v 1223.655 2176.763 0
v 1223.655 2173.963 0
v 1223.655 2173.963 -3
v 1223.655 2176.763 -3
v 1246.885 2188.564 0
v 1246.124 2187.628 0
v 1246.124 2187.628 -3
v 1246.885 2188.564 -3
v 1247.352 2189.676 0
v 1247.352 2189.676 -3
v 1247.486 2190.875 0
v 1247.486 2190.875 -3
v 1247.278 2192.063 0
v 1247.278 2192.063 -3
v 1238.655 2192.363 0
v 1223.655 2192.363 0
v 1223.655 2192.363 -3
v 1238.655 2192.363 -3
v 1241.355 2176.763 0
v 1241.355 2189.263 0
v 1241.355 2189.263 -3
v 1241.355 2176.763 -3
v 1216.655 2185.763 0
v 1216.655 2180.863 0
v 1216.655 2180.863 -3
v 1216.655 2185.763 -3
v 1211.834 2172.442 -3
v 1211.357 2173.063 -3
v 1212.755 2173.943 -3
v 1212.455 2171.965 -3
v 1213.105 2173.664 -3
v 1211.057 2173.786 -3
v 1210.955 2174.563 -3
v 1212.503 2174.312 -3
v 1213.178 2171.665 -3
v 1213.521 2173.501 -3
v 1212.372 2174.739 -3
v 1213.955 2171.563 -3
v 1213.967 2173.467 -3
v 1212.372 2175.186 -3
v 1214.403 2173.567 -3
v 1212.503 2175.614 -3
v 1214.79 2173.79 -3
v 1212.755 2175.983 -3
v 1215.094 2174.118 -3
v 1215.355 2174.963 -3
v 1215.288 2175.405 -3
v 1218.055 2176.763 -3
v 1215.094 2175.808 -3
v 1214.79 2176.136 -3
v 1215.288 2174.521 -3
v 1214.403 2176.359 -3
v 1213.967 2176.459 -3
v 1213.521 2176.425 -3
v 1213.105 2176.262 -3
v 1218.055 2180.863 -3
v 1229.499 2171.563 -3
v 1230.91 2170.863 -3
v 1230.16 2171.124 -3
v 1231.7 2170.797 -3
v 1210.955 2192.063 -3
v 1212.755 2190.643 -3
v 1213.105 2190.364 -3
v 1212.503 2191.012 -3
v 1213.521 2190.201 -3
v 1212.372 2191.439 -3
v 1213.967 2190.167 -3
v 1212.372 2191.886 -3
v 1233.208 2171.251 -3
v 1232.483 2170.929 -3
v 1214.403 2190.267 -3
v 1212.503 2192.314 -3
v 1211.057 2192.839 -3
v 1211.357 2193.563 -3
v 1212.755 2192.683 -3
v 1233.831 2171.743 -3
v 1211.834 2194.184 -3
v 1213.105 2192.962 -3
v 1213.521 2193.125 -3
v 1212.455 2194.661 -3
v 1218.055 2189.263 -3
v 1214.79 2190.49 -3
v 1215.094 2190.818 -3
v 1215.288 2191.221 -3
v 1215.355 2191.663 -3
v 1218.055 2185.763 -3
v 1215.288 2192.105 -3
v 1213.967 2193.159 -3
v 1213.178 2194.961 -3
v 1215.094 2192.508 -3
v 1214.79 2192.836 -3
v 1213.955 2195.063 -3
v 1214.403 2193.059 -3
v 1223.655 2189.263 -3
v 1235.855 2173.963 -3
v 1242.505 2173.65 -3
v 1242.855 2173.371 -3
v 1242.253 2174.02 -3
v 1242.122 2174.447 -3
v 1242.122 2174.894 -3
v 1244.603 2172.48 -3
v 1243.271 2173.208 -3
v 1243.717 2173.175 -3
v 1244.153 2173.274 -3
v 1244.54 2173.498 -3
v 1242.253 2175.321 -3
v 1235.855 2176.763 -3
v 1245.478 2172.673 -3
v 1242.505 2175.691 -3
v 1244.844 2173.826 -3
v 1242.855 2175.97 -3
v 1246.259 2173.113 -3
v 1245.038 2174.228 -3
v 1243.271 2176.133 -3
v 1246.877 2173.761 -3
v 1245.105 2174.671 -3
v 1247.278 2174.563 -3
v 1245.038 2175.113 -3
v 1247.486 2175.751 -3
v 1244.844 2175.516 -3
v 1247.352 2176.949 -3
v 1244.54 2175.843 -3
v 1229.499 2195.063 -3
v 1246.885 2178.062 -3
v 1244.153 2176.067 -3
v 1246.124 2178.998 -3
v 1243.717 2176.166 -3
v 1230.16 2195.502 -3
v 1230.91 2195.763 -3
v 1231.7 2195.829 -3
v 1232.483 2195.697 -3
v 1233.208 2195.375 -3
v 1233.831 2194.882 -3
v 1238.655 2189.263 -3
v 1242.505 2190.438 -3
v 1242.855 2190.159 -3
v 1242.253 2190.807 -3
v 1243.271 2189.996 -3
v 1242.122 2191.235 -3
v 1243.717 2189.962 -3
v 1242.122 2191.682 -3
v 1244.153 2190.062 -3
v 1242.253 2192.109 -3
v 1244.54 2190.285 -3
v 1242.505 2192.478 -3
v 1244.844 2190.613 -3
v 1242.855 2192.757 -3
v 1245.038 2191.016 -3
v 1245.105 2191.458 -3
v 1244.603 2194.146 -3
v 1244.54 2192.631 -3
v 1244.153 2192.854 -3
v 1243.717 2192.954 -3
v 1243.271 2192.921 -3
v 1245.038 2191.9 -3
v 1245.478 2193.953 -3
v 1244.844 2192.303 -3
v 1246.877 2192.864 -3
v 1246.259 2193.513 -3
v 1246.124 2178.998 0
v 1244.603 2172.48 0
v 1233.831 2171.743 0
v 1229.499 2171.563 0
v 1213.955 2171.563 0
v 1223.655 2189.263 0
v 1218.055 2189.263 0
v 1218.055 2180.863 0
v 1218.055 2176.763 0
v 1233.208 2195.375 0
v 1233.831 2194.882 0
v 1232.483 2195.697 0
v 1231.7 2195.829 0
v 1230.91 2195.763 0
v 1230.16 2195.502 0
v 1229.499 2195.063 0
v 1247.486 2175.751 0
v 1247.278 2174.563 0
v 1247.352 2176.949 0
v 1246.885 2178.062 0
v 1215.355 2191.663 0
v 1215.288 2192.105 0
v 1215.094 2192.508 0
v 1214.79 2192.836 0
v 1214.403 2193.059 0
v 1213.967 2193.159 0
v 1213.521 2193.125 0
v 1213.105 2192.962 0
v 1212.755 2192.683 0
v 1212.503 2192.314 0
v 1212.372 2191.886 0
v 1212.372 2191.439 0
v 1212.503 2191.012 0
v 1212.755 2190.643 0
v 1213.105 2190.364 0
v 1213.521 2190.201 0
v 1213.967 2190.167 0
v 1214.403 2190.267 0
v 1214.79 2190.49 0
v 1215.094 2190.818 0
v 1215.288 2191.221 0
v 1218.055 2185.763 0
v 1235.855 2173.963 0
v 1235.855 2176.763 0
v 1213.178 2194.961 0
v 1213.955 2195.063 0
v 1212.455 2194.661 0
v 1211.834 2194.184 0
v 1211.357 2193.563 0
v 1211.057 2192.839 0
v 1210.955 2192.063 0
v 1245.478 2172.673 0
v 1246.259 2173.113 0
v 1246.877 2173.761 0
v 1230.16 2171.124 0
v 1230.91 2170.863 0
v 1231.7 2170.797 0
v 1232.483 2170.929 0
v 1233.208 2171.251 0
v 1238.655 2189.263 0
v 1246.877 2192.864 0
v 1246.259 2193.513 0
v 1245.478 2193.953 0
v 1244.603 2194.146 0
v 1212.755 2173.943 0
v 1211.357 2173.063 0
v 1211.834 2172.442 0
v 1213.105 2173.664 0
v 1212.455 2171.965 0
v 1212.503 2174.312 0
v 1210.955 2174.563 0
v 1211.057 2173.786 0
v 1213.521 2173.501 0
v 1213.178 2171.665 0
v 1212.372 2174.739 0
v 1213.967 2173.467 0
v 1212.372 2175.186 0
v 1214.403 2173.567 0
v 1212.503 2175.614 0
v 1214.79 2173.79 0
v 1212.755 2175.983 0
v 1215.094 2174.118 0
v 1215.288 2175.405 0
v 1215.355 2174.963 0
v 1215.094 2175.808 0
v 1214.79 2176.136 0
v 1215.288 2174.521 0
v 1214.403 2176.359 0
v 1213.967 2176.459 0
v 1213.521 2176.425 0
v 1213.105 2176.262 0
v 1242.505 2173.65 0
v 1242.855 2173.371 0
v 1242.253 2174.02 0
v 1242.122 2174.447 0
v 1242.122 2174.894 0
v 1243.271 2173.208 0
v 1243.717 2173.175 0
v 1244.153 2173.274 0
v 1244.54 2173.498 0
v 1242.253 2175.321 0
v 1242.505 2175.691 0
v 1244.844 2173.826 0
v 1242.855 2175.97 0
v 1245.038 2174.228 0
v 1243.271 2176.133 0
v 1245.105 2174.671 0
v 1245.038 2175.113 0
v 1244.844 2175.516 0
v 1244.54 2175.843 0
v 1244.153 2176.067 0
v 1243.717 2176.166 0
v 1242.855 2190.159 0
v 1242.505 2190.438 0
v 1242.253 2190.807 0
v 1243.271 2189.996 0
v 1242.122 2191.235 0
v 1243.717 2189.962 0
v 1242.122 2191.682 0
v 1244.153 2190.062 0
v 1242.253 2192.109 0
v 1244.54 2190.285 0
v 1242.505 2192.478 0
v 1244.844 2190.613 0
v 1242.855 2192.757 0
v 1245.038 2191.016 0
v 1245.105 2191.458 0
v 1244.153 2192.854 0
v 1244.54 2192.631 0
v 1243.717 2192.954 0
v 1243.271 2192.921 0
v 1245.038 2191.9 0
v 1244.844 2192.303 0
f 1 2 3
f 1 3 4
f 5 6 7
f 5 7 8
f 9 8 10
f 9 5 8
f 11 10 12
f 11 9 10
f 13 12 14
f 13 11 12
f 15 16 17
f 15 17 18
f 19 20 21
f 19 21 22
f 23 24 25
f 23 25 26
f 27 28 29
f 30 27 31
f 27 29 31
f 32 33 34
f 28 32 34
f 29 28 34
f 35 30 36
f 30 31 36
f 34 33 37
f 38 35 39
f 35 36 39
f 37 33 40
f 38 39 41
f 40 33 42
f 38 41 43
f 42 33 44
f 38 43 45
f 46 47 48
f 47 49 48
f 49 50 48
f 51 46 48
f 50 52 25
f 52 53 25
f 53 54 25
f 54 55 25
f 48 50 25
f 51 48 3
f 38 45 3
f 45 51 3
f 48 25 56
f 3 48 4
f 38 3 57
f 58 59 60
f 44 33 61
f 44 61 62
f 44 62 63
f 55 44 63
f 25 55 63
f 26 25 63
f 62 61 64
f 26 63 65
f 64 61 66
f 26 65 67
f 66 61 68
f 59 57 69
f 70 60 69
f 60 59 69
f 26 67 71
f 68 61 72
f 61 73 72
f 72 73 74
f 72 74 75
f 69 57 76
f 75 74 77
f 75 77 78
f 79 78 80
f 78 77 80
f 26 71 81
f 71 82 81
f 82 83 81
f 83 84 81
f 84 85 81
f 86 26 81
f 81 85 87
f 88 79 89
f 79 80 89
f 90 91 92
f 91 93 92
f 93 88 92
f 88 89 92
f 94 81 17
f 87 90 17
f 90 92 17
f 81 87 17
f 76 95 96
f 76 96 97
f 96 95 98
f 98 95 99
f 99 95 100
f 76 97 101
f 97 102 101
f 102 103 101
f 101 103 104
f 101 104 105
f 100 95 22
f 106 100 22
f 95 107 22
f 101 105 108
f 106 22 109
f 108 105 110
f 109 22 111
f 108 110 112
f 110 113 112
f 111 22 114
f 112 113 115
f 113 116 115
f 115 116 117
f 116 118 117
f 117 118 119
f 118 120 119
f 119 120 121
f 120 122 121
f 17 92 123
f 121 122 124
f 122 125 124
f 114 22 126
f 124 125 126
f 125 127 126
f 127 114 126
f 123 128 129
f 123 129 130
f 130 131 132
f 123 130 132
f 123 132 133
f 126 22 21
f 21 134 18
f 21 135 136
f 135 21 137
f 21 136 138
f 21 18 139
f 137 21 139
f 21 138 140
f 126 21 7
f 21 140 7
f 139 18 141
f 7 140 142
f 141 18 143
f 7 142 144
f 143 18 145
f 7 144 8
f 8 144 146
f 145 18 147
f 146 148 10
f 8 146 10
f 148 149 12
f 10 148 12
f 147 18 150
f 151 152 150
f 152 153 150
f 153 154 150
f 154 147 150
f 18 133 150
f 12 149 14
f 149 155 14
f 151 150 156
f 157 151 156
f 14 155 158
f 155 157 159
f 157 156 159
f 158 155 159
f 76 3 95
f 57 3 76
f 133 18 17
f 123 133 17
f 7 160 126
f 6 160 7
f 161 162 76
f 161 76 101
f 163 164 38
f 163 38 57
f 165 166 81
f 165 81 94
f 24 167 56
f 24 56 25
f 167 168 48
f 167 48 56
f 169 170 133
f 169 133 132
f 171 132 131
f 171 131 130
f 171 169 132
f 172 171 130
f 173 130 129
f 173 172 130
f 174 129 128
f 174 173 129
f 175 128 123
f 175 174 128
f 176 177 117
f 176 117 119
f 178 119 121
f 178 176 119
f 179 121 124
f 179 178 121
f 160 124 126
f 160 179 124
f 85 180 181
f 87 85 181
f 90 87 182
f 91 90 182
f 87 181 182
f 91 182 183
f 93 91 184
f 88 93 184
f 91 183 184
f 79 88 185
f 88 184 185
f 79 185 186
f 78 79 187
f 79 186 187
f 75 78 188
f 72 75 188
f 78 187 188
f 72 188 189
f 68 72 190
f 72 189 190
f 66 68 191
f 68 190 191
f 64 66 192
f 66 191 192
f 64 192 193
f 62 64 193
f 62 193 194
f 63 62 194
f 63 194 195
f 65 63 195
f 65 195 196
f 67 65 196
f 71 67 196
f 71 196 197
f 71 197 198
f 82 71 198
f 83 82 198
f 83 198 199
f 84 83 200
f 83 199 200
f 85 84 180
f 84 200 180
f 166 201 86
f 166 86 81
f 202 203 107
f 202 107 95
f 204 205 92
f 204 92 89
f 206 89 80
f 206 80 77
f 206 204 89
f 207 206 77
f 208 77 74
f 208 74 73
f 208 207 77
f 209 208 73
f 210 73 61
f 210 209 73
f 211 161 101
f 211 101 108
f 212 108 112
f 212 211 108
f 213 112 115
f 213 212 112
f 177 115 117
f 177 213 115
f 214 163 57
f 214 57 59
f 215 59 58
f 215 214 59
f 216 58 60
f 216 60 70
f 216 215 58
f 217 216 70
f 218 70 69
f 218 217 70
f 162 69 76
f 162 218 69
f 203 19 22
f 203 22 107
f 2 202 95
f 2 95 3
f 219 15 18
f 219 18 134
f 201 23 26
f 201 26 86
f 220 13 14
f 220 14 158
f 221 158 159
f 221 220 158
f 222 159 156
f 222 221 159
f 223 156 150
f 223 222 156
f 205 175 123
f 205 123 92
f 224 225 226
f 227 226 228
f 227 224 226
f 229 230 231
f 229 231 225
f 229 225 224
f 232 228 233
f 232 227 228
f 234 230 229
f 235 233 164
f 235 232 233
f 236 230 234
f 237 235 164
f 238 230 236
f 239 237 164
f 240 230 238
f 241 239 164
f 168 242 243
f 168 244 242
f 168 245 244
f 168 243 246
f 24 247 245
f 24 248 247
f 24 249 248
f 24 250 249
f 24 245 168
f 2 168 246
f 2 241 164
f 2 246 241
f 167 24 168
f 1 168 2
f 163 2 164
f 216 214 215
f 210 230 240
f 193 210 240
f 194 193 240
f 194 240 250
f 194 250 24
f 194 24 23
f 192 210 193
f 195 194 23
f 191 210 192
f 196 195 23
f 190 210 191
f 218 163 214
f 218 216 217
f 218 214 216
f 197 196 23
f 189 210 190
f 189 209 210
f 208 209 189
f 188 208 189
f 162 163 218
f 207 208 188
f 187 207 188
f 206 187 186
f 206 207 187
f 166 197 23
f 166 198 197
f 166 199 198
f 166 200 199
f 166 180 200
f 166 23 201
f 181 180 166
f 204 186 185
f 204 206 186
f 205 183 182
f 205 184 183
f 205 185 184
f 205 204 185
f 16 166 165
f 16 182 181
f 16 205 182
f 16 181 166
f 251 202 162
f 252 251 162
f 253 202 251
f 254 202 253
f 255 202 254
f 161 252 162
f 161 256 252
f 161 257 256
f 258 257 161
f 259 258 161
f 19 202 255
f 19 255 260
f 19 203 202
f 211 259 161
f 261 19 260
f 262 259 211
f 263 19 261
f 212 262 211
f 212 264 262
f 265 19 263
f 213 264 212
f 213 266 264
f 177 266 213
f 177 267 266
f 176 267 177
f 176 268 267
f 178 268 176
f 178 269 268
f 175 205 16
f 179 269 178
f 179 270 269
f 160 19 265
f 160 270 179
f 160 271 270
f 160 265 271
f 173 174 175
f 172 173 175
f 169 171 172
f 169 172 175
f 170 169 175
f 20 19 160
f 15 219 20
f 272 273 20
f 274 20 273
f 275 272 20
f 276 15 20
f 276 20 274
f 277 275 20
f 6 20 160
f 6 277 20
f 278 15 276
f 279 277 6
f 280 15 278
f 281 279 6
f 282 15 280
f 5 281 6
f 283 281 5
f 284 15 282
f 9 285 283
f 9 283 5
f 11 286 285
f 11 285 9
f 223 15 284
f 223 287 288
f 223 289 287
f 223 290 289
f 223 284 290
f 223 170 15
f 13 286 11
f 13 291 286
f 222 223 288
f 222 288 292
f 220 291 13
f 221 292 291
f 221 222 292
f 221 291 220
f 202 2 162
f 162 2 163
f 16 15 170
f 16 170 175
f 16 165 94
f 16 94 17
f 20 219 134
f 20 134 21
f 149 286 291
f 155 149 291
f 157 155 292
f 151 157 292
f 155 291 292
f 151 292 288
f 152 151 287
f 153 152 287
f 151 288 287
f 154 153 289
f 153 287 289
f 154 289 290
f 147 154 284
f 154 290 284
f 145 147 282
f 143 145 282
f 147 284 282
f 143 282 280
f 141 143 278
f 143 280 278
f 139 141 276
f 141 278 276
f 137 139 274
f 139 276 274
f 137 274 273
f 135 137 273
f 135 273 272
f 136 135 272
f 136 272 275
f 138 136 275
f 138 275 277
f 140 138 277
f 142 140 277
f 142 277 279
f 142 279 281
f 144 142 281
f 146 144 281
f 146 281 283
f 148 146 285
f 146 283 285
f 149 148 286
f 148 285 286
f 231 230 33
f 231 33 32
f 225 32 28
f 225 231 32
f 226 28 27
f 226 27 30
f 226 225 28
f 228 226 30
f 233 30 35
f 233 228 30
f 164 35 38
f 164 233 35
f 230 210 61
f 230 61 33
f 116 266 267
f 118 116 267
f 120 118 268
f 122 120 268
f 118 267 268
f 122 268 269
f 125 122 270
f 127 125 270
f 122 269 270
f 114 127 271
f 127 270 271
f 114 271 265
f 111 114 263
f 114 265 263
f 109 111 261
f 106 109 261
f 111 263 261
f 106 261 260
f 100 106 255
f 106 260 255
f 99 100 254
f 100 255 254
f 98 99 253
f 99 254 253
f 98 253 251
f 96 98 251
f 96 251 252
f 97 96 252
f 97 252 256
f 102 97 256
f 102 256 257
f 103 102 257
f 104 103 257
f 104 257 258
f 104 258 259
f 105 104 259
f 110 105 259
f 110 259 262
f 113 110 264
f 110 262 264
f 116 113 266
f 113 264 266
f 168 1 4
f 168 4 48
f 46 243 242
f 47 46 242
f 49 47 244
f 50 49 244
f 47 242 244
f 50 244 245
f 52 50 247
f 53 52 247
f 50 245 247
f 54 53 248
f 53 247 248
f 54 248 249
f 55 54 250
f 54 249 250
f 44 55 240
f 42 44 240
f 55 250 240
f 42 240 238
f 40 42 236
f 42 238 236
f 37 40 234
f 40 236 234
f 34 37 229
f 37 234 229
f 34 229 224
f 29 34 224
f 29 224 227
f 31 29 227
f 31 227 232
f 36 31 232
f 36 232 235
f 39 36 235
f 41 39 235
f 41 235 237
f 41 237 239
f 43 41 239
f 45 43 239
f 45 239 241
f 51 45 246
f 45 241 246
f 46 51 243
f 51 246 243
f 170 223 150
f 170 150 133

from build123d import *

# Parameters (mm, degrees)
ESQUISSE1_R               = 1.5
T_LE_DE_BASE_PLI_E1_DEPTH = 3


# Sheet-metal steps are written as plain solids
with BuildPart() as part:
    # Esquisse1 → Tôle de base pliée1 (new body)
    with BuildSketch(Plane.XY):
        with BuildLine():
            Line((1210.954881098, 2192.062900441), (1210.954881098, 2174.562900441))
            ThreePointArc((1210.954881098, 2174.562900441), (1211.833560754, 2172.441580098), (1213.954881098, 2171.562900441))
            Line((1213.954881098, 2171.562900441), (1229.498862267, 2171.562900441))
            ThreePointArc((1229.498862267, 2171.562900441), (1231.700410864, 2170.796575468), (1233.830537909, 2171.743480404))
            Line((1233.830537909, 2171.743480404), (1244.602630734, 2172.48006345))
            ThreePointArc((1244.602630734, 2172.48006345), (1246.258569693, 2173.112570346), (1247.278053022, 2174.56269191))
            ThreePointArc((1247.278053022, 2174.56269191), (1247.351627268, 2176.949418696), (1246.12416641, 2178.997641771))
            Line((1246.12416641, 2178.997641771), (1246.12416641, 2187.628159112))
            ThreePointArc((1246.12416641, 2187.628159112), (1247.351627268, 2189.676382187), (1247.278053022, 2192.063108973))
            ThreePointArc((1247.278053022, 2192.063108973), (1246.258569693, 2193.513230537), (1244.602630734, 2194.145737433))
            Line((1244.602630734, 2194.145737433), (1233.830537909, 2194.882320479))
            ThreePointArc((1233.830537909, 2194.882320479), (1231.700410864, 2195.829225415), (1229.498862267, 2195.062900441))
            Line((1229.498862267, 2195.062900441), (1213.954881098, 2195.062900441))
            ThreePointArc((1213.954881098, 2195.062900441), (1211.833560754, 2194.184220785), (1210.954881098, 2192.062900441))
        make_face()
        with Locations((1243.604881098, 2191.458119207)):
            Circle(ESQUISSE1_R, mode=Mode.SUBTRACT)
        with Locations((1213.854881098, 2191.662900441)):
            Circle(ESQUISSE1_R, mode=Mode.SUBTRACT)
        with Locations((1213.854881098, 2174.962900441)):
            Circle(ESQUISSE1_R, mode=Mode.SUBTRACT)
        with Locations((1243.604881098, 2174.670527055)):
            Circle(ESQUISSE1_R, mode=Mode.SUBTRACT)
        Polygon((1241.354881098, 2189.262900441), (1241.354881098, 2176.762900441), (1235.854881098, 2176.762900441), (1235.854881098, 2173.962900441), (1223.654881098, 2173.962900441), (1223.654881098, 2176.762900441), (1218.054881098, 2176.762900441), (1218.054881098, 2180.862900441), (1216.654881098, 2180.862900441), (1216.654881098, 2185.762900441), (1218.054881098, 2185.762900441), (1218.054881098, 2189.262900441), (1223.654881098, 2189.262900441), (1223.654881098, 2192.362900441), (1238.654881098, 2192.362900441), (1238.654881098, 2189.262900441), align=None, mode=Mode.SUBTRACT)
    extrude(amount=-T_LE_DE_BASE_PLI_E1_DEPTH)


solid = part.part
